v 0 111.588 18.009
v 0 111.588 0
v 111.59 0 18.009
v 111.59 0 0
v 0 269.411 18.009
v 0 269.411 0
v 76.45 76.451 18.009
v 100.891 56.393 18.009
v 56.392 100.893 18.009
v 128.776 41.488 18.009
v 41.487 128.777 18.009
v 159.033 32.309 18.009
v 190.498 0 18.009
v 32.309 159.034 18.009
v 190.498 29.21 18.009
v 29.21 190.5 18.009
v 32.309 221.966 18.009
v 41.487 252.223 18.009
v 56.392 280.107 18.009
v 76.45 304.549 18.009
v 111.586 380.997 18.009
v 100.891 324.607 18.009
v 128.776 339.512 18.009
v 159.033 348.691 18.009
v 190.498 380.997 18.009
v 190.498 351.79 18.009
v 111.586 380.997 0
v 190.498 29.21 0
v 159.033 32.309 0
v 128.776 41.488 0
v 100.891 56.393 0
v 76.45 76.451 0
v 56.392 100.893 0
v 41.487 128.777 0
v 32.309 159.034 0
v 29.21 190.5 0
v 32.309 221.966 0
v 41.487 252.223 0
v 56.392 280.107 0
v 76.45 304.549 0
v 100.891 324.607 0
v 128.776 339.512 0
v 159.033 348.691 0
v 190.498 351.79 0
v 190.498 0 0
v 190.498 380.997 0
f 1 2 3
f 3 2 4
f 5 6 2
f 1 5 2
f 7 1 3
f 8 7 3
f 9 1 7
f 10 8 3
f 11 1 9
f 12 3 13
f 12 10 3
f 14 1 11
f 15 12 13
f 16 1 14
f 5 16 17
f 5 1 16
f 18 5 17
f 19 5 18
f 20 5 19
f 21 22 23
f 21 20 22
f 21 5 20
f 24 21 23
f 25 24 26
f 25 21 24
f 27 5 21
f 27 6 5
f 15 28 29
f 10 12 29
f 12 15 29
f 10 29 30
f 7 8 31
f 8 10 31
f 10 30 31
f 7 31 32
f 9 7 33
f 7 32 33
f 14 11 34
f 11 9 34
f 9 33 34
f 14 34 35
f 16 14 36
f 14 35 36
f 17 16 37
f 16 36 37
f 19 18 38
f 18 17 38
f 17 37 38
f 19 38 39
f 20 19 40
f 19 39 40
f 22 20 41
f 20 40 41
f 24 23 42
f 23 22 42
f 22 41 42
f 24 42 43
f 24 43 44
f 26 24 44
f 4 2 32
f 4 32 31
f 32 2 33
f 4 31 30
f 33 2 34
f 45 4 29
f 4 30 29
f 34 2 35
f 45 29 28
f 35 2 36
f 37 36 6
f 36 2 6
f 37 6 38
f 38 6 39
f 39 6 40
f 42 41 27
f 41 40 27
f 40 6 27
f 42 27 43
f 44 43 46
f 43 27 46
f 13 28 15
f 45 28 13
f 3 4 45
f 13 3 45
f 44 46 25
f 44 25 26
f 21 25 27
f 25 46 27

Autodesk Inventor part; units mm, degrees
ref_plane "YZ Plane" through (0, 0, 0) normal (1, 0, 0) x (0, 1, 0)
ref_plane "XZ Plane" through (0, 0, 0) normal (0, 1, 0) x (-1, 0, 0)
ref_plane "XY Plane" through (0, 0, 0) normal (0, 0, 1) x (1, 0, 0)
sketch "Sketch1" plane through (0, 0, 0) normal (0, 0, 1) x (1, 0, 0)
  circle A0 centre (190.5, 190.5) radius 161.29
  circle A1 centre (190.5, 190.5) radius 161.29
  line L0 (0, 269.4113) -> (111.5887, 381)
  line L1 (0, 269.4113) -> (157.8102, 269.4113) construction
  line L2 (0, 111.5878) -> (111.5895, 0)
  line L3 (269.4113, 0) -> (381, 111.5903)
  line L4 (380.9968, 269.4113) -> (269.4113, 381)
  line L5 (0, 0) -> (380.9968, 0)
  line L6 (380.9968, 0) -> (380.9968, 380.9968)
  line L7 (380.9968, 380.9968) -> (0, 380.9968)
  line L8 (0, 380.9968) -> (0, 0)
  line L9 (190.4984, 380.9968) -> (190.4984, 351.79)
  line L10 (190.4984, 29.21) -> (190.4984, 0)
  point P0 (111.5855, 380.9968)
  point P1 (111.5895, 0)
  point P2 (380.9968, 111.5871)
  point P3 (269.4145, 380.9968)
  dimension "d3" = 322.58
  dimension "d27" = 45
  dimension "d28" = 157.8102
  dimension "d30" = 157.8235
  dimension "d32" = 157.8218
  dimension "d40" = 157.808
  dimension "d42" = 380.9968
  dimension "d43" = 380.9968
  dimension "d44" = 190.5
  dimension "d45" = 190.5
  dimension "d46" = 111.5878
  dimension "d49" = 29.21
  dimension "d50" = 29.2068
  dimension "d51" = 269.4113
  dimension "d52" = 381
  dimension "d53" = 269.4113
  dimension "d54" = 157.821
  dimension "d55" = 111.5887
  dimension "d56" = 269.4113
  dimension "d57" = 111.5878
  dimension "d58" = 111.5895
  dimension "d59" = 111.5855
extrude "Extrusion3" add sketch "Sketch1" along normal blind 18.0086 contours A0 L10 L5 L2 L8 L0 L7 L9
properties part number "Tube Ring Half"
